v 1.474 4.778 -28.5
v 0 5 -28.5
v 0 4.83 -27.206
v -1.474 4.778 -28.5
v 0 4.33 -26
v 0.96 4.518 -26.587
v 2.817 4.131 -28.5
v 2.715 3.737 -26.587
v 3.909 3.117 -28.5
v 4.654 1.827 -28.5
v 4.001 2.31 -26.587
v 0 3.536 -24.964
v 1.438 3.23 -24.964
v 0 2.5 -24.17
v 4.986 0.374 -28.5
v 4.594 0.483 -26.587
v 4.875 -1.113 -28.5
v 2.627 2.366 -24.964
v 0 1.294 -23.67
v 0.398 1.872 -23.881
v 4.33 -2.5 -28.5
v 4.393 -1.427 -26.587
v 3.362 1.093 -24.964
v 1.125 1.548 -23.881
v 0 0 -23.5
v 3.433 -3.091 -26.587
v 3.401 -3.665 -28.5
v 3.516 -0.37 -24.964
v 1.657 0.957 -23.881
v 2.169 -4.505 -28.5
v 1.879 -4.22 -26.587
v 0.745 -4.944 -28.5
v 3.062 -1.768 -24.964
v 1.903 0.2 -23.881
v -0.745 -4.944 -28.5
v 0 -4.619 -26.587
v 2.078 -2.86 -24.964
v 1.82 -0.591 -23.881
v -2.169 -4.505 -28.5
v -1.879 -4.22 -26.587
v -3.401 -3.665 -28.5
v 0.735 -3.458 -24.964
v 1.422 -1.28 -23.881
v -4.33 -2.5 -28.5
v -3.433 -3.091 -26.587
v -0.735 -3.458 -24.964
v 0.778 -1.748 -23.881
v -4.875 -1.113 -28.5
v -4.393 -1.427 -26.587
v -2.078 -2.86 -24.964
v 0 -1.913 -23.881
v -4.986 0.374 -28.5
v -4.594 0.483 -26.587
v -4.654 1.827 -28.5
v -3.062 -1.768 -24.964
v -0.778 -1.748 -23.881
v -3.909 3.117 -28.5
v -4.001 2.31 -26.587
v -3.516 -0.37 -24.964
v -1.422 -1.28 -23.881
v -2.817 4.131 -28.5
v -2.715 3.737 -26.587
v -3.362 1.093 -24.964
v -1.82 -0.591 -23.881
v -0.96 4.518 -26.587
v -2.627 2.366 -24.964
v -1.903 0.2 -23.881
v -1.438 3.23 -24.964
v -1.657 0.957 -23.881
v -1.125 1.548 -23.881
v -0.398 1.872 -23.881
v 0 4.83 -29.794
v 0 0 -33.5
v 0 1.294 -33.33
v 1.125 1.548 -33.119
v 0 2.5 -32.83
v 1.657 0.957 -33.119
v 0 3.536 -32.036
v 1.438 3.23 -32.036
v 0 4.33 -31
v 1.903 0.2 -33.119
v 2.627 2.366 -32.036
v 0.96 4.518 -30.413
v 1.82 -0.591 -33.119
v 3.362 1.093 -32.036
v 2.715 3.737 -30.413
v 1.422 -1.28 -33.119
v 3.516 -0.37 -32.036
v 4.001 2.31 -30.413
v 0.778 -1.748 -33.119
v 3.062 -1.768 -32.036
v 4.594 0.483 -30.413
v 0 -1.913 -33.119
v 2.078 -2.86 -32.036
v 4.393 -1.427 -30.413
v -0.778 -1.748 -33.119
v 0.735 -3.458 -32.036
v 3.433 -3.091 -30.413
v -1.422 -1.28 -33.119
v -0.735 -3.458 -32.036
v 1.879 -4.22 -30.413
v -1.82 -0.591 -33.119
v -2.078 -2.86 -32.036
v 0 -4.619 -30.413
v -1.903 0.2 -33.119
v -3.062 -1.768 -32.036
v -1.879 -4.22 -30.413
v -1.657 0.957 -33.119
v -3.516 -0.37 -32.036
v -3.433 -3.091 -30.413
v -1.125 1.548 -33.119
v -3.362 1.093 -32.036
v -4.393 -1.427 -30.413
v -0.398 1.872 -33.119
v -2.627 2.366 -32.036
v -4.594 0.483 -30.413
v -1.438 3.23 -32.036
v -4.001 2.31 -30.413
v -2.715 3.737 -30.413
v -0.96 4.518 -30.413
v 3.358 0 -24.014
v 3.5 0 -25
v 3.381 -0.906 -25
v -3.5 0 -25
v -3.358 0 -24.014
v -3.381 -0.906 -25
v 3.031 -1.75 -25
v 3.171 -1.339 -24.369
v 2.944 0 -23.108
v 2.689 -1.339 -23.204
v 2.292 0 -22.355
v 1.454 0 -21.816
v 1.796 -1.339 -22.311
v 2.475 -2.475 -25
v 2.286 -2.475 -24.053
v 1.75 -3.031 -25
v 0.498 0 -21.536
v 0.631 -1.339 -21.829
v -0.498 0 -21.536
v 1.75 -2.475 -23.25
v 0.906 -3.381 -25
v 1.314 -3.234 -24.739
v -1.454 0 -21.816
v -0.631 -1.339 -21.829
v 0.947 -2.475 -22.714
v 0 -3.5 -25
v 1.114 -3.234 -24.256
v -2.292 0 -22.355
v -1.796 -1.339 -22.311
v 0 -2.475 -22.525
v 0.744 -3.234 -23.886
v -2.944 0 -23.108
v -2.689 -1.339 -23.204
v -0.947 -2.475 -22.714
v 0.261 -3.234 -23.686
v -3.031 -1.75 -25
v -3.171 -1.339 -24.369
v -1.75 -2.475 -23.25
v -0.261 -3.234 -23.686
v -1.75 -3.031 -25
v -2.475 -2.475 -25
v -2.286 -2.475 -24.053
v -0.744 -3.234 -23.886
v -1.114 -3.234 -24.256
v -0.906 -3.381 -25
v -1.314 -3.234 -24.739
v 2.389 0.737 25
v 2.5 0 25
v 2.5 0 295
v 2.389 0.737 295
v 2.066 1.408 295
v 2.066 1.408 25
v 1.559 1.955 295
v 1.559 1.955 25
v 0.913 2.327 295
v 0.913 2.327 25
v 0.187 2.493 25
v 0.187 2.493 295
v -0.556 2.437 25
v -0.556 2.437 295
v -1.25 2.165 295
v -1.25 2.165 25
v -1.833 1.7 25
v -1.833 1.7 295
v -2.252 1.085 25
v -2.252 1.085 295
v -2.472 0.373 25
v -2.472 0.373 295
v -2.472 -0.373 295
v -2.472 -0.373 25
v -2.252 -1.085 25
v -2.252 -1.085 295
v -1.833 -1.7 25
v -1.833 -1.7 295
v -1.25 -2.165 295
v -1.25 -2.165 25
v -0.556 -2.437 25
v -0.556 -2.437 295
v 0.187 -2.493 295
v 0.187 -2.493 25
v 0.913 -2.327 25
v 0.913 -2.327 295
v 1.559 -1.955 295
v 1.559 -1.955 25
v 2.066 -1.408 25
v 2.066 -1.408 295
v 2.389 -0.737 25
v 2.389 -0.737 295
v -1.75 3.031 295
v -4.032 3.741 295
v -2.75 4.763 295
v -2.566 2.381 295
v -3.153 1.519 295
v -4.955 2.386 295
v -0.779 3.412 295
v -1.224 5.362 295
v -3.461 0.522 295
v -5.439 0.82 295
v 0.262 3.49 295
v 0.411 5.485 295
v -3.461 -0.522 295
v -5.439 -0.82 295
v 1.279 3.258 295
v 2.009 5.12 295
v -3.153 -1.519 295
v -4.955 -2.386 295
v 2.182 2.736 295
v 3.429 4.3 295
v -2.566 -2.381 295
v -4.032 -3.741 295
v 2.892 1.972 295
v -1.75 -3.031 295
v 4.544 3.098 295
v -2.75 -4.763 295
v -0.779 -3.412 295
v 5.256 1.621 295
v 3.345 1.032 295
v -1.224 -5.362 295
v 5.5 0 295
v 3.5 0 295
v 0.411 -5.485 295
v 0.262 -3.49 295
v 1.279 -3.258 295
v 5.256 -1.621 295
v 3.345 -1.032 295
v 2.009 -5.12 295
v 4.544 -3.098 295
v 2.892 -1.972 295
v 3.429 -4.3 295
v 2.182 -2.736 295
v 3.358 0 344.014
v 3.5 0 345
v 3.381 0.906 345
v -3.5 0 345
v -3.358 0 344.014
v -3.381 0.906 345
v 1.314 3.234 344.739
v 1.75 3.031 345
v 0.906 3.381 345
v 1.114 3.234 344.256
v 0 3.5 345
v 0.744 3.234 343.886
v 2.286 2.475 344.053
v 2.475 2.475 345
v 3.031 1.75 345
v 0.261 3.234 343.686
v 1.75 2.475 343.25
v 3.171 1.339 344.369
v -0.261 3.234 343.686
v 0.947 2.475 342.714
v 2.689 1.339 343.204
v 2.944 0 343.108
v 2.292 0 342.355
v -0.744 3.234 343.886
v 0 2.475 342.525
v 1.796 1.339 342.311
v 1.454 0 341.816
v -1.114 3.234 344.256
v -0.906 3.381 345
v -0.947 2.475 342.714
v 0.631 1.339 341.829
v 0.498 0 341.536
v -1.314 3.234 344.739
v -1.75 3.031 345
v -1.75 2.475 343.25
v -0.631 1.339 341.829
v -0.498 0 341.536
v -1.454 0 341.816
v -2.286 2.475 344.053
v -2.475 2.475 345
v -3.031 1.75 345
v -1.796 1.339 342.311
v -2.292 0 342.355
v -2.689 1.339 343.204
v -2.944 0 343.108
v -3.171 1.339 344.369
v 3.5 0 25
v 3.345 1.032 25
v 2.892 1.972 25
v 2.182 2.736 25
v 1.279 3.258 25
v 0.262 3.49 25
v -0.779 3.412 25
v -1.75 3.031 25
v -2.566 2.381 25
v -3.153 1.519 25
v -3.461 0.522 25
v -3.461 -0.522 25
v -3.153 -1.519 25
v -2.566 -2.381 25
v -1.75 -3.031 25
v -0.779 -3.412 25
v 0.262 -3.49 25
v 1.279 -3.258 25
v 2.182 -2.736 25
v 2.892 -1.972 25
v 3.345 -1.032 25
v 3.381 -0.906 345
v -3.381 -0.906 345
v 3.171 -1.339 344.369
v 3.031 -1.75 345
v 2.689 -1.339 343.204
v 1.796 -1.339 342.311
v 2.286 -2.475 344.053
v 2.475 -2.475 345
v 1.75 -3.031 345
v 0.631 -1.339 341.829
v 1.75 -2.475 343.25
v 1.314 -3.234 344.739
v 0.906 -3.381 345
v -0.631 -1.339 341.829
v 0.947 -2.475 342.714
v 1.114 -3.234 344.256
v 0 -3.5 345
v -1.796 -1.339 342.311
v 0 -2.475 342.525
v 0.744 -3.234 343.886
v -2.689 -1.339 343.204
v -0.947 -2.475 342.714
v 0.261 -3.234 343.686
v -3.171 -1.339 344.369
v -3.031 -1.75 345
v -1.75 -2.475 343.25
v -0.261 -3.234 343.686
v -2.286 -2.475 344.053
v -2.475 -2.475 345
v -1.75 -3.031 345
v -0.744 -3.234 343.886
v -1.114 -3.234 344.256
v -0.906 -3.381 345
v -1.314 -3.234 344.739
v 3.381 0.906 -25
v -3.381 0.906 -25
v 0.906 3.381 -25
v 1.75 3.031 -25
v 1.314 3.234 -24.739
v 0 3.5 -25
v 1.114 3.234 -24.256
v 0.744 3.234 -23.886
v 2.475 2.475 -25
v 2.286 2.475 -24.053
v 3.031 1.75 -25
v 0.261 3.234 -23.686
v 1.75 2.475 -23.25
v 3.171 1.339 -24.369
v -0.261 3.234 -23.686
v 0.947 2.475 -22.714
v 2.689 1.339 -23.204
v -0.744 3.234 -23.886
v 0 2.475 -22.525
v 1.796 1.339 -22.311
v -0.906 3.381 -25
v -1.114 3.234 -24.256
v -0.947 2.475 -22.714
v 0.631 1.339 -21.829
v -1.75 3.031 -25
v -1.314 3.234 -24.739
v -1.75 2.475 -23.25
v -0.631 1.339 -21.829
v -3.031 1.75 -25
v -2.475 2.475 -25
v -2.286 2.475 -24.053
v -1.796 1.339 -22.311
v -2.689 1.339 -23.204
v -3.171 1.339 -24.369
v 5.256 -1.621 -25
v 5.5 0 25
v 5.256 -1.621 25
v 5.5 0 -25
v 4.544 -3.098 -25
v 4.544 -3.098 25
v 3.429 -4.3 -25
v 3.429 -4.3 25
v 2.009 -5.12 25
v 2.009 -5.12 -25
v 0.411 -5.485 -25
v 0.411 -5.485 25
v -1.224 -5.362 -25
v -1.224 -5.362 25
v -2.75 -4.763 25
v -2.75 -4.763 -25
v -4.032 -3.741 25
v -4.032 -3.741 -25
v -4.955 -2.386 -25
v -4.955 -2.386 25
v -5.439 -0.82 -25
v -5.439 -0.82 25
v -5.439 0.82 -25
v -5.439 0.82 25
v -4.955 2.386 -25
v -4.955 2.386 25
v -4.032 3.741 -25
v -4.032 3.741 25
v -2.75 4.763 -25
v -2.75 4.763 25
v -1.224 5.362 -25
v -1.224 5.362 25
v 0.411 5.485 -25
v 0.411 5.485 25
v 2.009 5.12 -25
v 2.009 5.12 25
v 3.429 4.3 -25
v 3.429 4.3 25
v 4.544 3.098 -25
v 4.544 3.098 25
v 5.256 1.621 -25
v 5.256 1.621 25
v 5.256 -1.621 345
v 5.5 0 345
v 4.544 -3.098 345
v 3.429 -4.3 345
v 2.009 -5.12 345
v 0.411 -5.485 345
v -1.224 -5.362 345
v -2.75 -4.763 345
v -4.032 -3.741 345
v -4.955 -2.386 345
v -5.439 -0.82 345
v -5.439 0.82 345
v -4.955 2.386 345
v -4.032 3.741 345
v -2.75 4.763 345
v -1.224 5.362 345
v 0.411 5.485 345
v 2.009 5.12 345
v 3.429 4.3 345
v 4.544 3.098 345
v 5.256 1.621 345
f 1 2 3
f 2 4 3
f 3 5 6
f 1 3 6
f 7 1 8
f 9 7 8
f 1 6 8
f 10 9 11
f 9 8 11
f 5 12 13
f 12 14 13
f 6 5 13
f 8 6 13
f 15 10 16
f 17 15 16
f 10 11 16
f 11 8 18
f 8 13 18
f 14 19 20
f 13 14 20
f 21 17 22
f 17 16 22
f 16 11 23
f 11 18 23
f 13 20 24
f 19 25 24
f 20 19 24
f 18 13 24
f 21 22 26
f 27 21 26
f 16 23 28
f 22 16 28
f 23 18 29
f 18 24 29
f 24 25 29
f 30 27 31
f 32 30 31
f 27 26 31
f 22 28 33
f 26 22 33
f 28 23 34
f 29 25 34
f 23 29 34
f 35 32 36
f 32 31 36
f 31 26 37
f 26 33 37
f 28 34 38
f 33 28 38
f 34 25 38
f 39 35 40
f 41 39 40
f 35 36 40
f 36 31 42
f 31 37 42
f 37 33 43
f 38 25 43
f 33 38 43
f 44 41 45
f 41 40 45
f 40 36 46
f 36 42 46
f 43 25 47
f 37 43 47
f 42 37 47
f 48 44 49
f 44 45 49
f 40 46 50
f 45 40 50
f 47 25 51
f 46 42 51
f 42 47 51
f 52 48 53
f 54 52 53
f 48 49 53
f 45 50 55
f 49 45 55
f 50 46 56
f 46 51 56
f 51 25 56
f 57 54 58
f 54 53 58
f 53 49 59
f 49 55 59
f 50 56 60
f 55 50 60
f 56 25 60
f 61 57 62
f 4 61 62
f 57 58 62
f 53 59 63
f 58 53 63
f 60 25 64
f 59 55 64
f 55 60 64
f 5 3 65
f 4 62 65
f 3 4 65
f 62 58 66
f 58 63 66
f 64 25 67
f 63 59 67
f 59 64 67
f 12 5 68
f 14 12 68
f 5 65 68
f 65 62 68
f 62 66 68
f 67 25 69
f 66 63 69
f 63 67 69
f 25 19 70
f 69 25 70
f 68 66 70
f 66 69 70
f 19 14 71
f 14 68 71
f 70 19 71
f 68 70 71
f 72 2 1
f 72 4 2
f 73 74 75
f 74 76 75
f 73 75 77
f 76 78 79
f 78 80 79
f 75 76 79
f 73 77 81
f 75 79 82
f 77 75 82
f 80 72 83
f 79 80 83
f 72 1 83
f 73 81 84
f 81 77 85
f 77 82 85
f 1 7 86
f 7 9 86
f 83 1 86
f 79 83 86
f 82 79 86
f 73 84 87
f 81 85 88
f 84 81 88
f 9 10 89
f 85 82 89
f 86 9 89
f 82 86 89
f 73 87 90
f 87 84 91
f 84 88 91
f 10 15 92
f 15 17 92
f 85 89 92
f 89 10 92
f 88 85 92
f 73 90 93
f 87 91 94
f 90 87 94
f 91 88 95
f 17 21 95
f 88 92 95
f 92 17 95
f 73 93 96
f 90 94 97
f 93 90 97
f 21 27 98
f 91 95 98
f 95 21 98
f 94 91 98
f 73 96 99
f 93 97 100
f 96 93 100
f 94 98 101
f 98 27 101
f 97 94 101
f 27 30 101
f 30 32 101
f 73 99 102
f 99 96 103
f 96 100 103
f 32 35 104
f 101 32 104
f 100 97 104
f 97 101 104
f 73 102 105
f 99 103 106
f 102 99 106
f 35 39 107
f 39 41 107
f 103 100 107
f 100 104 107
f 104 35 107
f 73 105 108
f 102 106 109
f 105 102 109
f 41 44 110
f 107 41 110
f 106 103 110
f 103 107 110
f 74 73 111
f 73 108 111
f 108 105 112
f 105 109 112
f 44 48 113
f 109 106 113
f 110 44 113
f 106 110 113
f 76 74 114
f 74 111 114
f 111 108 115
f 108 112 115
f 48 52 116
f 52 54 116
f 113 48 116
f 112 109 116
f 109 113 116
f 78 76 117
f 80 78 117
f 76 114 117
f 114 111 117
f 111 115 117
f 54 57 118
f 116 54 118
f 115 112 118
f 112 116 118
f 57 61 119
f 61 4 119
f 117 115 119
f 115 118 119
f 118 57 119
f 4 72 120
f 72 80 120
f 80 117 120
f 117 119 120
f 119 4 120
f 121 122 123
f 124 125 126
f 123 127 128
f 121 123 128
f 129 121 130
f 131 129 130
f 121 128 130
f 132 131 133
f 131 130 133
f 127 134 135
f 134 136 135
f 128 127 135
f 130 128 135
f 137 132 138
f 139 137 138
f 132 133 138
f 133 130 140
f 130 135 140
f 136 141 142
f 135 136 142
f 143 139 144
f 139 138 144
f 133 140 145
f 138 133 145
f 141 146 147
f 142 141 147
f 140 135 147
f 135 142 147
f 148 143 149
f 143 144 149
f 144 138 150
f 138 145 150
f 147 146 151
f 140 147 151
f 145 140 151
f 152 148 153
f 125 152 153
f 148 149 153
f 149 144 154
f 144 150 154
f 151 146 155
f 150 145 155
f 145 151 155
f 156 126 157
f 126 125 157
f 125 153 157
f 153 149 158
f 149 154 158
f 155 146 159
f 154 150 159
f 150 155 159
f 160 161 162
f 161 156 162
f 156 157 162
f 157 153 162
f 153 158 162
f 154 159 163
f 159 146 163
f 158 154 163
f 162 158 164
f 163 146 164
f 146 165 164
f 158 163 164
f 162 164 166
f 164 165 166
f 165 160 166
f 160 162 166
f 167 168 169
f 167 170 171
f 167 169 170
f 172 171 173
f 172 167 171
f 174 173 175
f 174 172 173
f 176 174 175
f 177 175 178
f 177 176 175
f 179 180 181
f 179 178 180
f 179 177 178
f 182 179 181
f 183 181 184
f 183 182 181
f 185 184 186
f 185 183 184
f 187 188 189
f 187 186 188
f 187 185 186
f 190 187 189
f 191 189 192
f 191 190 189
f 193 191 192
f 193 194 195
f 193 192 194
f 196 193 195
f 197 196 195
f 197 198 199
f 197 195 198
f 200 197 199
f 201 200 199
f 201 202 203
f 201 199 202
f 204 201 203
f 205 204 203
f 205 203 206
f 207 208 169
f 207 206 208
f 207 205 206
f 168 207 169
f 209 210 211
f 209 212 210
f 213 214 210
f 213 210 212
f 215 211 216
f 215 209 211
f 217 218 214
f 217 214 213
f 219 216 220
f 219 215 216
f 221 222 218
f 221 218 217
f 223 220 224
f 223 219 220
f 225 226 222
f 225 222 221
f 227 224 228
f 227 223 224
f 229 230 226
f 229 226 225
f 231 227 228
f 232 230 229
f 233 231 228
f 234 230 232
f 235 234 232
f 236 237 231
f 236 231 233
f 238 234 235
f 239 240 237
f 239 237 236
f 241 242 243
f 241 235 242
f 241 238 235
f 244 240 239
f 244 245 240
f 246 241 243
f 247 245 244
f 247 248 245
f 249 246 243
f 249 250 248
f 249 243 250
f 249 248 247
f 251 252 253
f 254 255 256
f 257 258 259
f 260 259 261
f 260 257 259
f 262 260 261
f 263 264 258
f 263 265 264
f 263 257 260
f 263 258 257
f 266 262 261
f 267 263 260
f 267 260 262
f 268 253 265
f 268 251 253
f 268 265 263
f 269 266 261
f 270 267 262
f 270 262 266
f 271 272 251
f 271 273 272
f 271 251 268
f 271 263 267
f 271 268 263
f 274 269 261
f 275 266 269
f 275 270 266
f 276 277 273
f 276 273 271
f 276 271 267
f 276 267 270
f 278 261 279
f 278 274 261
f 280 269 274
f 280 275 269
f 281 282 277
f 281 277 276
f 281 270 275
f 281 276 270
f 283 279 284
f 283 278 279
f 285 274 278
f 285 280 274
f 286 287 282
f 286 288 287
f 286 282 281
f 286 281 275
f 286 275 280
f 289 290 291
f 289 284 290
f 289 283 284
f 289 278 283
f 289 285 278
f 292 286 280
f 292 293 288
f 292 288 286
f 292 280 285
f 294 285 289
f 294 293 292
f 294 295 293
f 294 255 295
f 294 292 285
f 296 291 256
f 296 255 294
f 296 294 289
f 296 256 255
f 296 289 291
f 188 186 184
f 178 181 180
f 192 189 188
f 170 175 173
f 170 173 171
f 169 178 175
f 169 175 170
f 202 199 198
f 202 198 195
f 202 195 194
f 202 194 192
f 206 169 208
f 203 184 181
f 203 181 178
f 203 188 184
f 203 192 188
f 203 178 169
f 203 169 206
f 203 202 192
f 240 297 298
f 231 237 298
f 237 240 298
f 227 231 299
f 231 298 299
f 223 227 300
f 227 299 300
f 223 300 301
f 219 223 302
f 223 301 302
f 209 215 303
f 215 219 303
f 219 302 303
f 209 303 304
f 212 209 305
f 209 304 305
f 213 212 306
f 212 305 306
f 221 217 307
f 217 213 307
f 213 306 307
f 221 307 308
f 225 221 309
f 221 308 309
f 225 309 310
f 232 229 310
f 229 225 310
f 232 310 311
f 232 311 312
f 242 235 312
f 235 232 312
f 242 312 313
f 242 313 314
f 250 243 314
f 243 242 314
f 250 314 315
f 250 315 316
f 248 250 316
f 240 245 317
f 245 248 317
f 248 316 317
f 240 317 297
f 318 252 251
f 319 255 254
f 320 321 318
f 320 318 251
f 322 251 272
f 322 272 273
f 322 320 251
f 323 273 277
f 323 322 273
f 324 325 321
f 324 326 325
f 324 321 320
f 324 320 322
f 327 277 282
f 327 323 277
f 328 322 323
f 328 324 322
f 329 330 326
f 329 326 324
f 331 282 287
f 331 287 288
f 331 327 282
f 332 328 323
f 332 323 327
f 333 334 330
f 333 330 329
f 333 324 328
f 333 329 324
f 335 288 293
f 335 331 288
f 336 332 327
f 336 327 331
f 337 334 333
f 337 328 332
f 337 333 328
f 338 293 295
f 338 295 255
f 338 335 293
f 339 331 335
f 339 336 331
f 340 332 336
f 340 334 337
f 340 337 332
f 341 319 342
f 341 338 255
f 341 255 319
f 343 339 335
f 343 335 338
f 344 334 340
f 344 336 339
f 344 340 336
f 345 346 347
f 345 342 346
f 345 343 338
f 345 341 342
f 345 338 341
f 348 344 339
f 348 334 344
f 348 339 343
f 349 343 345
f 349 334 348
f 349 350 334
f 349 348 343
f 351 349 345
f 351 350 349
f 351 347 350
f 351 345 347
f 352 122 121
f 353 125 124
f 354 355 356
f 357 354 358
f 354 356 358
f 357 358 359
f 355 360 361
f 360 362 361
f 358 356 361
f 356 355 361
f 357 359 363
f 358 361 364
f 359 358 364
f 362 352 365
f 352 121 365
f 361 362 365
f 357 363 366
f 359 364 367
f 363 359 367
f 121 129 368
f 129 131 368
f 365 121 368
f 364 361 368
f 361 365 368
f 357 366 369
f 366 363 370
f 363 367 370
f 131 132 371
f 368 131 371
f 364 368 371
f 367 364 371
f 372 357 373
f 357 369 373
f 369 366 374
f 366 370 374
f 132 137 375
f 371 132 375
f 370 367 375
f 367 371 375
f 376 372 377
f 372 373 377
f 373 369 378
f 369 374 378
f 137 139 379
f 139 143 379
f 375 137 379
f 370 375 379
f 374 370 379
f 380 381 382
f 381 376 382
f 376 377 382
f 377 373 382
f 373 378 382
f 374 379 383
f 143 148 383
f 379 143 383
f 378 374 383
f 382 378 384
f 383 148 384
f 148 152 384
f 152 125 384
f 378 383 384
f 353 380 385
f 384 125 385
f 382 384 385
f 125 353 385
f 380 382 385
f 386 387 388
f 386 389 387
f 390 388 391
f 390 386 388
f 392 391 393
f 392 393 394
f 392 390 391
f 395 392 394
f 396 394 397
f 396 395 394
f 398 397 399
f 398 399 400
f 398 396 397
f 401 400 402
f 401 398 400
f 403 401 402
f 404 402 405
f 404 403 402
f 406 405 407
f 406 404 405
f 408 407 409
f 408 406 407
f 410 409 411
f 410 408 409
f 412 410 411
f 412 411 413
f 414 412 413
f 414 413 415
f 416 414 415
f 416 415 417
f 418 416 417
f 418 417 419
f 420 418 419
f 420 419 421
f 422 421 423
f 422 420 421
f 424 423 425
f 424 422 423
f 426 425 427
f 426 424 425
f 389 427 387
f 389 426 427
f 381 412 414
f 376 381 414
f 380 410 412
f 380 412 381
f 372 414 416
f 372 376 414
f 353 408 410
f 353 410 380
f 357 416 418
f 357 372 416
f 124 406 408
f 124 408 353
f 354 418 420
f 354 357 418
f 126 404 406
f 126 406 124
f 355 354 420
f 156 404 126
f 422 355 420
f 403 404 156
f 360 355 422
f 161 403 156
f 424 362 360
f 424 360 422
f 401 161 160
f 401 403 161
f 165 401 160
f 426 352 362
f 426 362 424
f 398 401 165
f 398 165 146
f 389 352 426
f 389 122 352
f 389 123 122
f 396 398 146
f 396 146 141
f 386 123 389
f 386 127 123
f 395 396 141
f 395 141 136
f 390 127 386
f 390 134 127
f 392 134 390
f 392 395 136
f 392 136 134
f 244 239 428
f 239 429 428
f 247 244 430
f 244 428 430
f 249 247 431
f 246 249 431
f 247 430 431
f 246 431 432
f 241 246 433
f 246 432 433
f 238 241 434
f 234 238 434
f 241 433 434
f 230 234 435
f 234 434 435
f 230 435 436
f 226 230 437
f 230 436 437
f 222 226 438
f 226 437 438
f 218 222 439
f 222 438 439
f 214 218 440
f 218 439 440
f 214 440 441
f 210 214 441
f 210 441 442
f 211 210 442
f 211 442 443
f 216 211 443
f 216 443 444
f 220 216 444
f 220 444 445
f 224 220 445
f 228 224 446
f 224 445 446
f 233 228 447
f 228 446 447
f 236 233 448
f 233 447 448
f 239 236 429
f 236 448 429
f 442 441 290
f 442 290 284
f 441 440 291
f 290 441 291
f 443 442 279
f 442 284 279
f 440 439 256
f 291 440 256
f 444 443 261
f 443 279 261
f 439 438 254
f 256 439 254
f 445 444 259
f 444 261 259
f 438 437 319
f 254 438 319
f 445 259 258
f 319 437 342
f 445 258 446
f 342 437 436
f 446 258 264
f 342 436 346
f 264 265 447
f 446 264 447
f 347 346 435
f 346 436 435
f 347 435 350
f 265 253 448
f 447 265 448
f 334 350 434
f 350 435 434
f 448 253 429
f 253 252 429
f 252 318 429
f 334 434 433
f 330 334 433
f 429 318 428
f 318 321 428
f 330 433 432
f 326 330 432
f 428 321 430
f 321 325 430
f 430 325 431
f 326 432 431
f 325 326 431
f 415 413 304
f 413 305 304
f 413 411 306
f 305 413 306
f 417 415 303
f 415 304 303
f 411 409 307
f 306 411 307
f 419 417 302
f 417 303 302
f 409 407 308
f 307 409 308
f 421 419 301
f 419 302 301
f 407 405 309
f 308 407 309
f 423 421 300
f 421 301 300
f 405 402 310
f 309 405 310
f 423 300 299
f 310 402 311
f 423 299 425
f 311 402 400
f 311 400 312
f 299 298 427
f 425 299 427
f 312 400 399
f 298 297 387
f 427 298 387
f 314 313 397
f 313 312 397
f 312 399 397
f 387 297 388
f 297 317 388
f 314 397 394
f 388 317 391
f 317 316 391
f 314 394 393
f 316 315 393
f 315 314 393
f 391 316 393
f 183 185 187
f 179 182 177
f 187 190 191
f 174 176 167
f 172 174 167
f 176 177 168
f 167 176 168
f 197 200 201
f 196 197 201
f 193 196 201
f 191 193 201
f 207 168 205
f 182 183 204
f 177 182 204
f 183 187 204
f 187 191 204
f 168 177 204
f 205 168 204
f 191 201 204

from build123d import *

# Parameters (mm, degrees)
F0_R          = 3.5
F0_R_2        = 2.5
F1_DEPTH      = 300
F2_R          = 5.5
F3_DEPTH      = 25
F3_DEPTH_BACK = 25


with BuildPart() as f1:
    # F0 (on Top) → F1 (new body)
    with BuildSketch(Plane.XY):
        Circle(F0_R)
        Circle(F0_R_2, mode=Mode.SUBTRACT)
    extrude(amount=F1_DEPTH)

    # F2 (on face) → F3 (join, two sides)
    with BuildSketch(Plane(origin=(0, 0, 0), x_dir=(1, 0, 0), z_dir=(0, 0, -1))) as f3_sk:
        Circle(F2_R)
    extrude(amount=F3_DEPTH)
    extrude(f3_sk.sketch, amount=-F3_DEPTH_BACK)

    # F4 (on face) → F5 (revolve, cut)
    with BuildSketch(Plane(origin=(0, 0, -25), x_dir=(1, 0, 0), z_dir=(0, 0, -1))):
        with BuildLine():
            Line((0, 3.5), (0, -3.5))
            ThreePointArc((0, -3.5), (2.4748737342, -2.4748737342), (3.5, 0))
            ThreePointArc((3.5, 0), (2.4748737342, 2.4748737342), (0, 3.5))
        make_face()
    revolve(axis=Axis((0, 0, -25), (0, -1, 0)), mode=Mode.SUBTRACT)

    # F9: F1 across plane


with BuildPart() as f7:
    # F6 (on Right) → F7 (revolve)
    with BuildSketch(Plane.YZ):
        with BuildLine():
            ThreePointArc((0, -33.5), (3.5355339059, -32.0355339059), (5, -28.5))
            ThreePointArc((5, -28.5), (3.5355339059, -24.9644660941), (0, -23.5))
            Line((0, -23.5), (0, -33.5))
        make_face()
    revolve(axis=Axis((0, 0, -28.5), (0, 0, -1)))


with BuildPart() as f1_1:
    add(f1.part)
    add(f1.part.mirror(Plane.XY.offset(160)))


solid = Compound([f7.part, f1_1.part])
